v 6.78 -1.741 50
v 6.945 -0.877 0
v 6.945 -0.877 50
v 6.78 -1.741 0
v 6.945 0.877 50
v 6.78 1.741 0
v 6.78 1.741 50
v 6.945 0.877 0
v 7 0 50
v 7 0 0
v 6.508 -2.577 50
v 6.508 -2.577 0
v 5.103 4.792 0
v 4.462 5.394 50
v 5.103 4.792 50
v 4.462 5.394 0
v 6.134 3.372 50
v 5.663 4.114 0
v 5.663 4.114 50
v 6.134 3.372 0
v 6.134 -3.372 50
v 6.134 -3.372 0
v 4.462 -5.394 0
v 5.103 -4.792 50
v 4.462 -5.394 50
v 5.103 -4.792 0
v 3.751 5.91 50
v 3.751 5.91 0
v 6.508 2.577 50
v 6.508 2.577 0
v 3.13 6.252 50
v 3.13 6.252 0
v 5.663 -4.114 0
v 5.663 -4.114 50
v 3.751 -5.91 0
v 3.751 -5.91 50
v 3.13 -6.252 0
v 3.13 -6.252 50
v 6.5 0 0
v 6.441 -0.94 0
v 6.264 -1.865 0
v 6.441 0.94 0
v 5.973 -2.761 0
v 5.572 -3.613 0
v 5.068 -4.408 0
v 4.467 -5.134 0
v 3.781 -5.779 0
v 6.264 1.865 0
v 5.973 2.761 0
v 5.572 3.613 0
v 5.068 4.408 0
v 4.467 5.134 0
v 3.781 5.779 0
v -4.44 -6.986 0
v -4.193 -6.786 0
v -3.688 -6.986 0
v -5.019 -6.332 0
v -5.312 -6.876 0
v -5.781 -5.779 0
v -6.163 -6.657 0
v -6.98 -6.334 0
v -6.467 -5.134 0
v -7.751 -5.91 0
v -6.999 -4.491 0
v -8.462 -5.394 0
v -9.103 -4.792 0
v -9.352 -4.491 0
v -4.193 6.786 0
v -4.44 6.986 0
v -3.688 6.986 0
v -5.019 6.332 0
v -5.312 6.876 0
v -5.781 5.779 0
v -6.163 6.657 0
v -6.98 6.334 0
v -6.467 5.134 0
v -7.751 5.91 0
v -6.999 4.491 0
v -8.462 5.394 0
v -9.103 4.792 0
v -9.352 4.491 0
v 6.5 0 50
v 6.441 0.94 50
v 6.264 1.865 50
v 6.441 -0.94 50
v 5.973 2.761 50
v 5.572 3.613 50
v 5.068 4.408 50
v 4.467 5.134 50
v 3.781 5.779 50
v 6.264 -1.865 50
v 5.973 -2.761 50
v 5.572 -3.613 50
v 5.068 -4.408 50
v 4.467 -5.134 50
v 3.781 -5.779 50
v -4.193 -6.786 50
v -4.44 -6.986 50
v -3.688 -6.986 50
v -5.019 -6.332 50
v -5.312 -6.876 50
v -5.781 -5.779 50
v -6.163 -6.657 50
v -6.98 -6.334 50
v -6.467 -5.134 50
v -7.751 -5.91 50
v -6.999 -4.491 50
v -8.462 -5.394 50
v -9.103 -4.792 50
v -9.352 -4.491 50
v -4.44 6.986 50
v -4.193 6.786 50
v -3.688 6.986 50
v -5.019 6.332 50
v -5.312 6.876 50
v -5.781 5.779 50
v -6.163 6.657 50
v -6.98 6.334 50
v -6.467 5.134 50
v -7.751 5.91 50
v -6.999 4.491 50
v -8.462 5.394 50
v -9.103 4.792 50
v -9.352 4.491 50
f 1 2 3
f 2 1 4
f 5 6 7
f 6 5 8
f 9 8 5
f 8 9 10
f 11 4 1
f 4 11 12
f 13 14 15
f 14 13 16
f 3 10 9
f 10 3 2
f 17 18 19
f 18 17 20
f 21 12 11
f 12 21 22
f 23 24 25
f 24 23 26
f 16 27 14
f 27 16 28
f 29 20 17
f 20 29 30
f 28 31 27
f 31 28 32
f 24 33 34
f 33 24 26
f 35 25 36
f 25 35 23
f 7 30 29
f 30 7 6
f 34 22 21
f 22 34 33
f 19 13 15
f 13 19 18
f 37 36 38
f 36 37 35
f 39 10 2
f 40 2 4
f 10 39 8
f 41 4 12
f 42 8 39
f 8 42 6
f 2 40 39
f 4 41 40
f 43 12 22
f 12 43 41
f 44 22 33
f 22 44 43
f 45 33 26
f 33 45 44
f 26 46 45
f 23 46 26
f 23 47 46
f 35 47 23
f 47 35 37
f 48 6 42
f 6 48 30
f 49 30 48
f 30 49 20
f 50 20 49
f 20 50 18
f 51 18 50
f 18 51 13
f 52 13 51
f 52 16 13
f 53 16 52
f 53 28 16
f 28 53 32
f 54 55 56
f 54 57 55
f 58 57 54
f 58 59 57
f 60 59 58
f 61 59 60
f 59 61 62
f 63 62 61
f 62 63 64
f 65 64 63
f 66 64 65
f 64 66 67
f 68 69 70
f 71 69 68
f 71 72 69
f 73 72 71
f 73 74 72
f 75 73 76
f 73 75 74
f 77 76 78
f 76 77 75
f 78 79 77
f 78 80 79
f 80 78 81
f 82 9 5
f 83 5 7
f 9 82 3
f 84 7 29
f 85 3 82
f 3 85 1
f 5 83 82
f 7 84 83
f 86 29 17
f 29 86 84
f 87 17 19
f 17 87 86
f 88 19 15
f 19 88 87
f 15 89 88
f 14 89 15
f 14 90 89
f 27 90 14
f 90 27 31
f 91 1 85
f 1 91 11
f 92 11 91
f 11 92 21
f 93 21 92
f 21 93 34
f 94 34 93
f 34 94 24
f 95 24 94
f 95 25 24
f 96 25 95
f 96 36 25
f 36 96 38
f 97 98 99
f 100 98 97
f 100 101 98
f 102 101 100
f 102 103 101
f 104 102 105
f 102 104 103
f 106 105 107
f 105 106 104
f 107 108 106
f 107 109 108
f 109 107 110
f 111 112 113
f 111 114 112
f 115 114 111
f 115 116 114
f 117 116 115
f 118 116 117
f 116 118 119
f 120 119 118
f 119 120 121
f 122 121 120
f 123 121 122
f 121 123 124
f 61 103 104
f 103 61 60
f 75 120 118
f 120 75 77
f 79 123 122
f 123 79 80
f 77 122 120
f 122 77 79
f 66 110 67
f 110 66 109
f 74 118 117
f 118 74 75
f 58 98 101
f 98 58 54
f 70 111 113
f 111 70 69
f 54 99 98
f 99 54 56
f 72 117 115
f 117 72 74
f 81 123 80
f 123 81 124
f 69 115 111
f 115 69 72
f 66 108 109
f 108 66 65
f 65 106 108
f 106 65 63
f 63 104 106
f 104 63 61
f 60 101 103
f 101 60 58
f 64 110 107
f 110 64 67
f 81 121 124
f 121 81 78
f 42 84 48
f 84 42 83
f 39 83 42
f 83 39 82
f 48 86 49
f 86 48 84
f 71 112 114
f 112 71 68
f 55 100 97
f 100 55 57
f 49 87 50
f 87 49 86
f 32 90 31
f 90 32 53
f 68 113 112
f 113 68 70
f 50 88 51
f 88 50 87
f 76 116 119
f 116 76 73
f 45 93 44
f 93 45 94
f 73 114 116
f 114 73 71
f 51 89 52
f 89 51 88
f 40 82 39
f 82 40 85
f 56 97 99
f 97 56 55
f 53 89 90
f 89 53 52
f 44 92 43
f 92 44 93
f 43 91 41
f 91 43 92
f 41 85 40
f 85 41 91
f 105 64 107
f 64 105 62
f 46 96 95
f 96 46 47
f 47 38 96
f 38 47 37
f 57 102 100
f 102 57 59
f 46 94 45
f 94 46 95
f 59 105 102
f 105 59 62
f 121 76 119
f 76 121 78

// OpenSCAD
$fn = 50;


difference() {
	union() {
		cylinder(h = 50, r = 7.0000000000);
		translate(v = [-4.0000000000, 0, 0]) {
			cylinder(h = 50, r = 7.0000000000);
		}
	}
	union() {
		cylinder(h = 50, r = 3.2500000000);
		cylinder(h = 50, r = 1.8000000000);
		cylinder(h = 50, r = 1.8000000000);
		cylinder(h = 50, r = 1.8000000000);
		translate(v = [-8.5000000000, 0, 0]) {
			hull() {
				translate(v = [-3.7500000000, 0.0000000000, 0]) {
					cylinder(h = 50, r = 4.5000000000);
				}
				translate(v = [3.7500000000, 0.0000000000, 0]) {
					cylinder(h = 50, r = 4.5000000000);
				}
				translate(v = [-3.7500000000, -0.0000000000, 0]) {
					cylinder(h = 50, r = 4.5000000000);
				}
				translate(v = [3.7500000000, -0.0000000000, 0]) {
					cylinder(h = 50, r = 4.5000000000);
				}
			}
		}
		translate(v = [-1.0000000000, 0, 0.0000000000]) {
			cylinder(h = 50, r = 7.5000000000);
		}
	}
}
